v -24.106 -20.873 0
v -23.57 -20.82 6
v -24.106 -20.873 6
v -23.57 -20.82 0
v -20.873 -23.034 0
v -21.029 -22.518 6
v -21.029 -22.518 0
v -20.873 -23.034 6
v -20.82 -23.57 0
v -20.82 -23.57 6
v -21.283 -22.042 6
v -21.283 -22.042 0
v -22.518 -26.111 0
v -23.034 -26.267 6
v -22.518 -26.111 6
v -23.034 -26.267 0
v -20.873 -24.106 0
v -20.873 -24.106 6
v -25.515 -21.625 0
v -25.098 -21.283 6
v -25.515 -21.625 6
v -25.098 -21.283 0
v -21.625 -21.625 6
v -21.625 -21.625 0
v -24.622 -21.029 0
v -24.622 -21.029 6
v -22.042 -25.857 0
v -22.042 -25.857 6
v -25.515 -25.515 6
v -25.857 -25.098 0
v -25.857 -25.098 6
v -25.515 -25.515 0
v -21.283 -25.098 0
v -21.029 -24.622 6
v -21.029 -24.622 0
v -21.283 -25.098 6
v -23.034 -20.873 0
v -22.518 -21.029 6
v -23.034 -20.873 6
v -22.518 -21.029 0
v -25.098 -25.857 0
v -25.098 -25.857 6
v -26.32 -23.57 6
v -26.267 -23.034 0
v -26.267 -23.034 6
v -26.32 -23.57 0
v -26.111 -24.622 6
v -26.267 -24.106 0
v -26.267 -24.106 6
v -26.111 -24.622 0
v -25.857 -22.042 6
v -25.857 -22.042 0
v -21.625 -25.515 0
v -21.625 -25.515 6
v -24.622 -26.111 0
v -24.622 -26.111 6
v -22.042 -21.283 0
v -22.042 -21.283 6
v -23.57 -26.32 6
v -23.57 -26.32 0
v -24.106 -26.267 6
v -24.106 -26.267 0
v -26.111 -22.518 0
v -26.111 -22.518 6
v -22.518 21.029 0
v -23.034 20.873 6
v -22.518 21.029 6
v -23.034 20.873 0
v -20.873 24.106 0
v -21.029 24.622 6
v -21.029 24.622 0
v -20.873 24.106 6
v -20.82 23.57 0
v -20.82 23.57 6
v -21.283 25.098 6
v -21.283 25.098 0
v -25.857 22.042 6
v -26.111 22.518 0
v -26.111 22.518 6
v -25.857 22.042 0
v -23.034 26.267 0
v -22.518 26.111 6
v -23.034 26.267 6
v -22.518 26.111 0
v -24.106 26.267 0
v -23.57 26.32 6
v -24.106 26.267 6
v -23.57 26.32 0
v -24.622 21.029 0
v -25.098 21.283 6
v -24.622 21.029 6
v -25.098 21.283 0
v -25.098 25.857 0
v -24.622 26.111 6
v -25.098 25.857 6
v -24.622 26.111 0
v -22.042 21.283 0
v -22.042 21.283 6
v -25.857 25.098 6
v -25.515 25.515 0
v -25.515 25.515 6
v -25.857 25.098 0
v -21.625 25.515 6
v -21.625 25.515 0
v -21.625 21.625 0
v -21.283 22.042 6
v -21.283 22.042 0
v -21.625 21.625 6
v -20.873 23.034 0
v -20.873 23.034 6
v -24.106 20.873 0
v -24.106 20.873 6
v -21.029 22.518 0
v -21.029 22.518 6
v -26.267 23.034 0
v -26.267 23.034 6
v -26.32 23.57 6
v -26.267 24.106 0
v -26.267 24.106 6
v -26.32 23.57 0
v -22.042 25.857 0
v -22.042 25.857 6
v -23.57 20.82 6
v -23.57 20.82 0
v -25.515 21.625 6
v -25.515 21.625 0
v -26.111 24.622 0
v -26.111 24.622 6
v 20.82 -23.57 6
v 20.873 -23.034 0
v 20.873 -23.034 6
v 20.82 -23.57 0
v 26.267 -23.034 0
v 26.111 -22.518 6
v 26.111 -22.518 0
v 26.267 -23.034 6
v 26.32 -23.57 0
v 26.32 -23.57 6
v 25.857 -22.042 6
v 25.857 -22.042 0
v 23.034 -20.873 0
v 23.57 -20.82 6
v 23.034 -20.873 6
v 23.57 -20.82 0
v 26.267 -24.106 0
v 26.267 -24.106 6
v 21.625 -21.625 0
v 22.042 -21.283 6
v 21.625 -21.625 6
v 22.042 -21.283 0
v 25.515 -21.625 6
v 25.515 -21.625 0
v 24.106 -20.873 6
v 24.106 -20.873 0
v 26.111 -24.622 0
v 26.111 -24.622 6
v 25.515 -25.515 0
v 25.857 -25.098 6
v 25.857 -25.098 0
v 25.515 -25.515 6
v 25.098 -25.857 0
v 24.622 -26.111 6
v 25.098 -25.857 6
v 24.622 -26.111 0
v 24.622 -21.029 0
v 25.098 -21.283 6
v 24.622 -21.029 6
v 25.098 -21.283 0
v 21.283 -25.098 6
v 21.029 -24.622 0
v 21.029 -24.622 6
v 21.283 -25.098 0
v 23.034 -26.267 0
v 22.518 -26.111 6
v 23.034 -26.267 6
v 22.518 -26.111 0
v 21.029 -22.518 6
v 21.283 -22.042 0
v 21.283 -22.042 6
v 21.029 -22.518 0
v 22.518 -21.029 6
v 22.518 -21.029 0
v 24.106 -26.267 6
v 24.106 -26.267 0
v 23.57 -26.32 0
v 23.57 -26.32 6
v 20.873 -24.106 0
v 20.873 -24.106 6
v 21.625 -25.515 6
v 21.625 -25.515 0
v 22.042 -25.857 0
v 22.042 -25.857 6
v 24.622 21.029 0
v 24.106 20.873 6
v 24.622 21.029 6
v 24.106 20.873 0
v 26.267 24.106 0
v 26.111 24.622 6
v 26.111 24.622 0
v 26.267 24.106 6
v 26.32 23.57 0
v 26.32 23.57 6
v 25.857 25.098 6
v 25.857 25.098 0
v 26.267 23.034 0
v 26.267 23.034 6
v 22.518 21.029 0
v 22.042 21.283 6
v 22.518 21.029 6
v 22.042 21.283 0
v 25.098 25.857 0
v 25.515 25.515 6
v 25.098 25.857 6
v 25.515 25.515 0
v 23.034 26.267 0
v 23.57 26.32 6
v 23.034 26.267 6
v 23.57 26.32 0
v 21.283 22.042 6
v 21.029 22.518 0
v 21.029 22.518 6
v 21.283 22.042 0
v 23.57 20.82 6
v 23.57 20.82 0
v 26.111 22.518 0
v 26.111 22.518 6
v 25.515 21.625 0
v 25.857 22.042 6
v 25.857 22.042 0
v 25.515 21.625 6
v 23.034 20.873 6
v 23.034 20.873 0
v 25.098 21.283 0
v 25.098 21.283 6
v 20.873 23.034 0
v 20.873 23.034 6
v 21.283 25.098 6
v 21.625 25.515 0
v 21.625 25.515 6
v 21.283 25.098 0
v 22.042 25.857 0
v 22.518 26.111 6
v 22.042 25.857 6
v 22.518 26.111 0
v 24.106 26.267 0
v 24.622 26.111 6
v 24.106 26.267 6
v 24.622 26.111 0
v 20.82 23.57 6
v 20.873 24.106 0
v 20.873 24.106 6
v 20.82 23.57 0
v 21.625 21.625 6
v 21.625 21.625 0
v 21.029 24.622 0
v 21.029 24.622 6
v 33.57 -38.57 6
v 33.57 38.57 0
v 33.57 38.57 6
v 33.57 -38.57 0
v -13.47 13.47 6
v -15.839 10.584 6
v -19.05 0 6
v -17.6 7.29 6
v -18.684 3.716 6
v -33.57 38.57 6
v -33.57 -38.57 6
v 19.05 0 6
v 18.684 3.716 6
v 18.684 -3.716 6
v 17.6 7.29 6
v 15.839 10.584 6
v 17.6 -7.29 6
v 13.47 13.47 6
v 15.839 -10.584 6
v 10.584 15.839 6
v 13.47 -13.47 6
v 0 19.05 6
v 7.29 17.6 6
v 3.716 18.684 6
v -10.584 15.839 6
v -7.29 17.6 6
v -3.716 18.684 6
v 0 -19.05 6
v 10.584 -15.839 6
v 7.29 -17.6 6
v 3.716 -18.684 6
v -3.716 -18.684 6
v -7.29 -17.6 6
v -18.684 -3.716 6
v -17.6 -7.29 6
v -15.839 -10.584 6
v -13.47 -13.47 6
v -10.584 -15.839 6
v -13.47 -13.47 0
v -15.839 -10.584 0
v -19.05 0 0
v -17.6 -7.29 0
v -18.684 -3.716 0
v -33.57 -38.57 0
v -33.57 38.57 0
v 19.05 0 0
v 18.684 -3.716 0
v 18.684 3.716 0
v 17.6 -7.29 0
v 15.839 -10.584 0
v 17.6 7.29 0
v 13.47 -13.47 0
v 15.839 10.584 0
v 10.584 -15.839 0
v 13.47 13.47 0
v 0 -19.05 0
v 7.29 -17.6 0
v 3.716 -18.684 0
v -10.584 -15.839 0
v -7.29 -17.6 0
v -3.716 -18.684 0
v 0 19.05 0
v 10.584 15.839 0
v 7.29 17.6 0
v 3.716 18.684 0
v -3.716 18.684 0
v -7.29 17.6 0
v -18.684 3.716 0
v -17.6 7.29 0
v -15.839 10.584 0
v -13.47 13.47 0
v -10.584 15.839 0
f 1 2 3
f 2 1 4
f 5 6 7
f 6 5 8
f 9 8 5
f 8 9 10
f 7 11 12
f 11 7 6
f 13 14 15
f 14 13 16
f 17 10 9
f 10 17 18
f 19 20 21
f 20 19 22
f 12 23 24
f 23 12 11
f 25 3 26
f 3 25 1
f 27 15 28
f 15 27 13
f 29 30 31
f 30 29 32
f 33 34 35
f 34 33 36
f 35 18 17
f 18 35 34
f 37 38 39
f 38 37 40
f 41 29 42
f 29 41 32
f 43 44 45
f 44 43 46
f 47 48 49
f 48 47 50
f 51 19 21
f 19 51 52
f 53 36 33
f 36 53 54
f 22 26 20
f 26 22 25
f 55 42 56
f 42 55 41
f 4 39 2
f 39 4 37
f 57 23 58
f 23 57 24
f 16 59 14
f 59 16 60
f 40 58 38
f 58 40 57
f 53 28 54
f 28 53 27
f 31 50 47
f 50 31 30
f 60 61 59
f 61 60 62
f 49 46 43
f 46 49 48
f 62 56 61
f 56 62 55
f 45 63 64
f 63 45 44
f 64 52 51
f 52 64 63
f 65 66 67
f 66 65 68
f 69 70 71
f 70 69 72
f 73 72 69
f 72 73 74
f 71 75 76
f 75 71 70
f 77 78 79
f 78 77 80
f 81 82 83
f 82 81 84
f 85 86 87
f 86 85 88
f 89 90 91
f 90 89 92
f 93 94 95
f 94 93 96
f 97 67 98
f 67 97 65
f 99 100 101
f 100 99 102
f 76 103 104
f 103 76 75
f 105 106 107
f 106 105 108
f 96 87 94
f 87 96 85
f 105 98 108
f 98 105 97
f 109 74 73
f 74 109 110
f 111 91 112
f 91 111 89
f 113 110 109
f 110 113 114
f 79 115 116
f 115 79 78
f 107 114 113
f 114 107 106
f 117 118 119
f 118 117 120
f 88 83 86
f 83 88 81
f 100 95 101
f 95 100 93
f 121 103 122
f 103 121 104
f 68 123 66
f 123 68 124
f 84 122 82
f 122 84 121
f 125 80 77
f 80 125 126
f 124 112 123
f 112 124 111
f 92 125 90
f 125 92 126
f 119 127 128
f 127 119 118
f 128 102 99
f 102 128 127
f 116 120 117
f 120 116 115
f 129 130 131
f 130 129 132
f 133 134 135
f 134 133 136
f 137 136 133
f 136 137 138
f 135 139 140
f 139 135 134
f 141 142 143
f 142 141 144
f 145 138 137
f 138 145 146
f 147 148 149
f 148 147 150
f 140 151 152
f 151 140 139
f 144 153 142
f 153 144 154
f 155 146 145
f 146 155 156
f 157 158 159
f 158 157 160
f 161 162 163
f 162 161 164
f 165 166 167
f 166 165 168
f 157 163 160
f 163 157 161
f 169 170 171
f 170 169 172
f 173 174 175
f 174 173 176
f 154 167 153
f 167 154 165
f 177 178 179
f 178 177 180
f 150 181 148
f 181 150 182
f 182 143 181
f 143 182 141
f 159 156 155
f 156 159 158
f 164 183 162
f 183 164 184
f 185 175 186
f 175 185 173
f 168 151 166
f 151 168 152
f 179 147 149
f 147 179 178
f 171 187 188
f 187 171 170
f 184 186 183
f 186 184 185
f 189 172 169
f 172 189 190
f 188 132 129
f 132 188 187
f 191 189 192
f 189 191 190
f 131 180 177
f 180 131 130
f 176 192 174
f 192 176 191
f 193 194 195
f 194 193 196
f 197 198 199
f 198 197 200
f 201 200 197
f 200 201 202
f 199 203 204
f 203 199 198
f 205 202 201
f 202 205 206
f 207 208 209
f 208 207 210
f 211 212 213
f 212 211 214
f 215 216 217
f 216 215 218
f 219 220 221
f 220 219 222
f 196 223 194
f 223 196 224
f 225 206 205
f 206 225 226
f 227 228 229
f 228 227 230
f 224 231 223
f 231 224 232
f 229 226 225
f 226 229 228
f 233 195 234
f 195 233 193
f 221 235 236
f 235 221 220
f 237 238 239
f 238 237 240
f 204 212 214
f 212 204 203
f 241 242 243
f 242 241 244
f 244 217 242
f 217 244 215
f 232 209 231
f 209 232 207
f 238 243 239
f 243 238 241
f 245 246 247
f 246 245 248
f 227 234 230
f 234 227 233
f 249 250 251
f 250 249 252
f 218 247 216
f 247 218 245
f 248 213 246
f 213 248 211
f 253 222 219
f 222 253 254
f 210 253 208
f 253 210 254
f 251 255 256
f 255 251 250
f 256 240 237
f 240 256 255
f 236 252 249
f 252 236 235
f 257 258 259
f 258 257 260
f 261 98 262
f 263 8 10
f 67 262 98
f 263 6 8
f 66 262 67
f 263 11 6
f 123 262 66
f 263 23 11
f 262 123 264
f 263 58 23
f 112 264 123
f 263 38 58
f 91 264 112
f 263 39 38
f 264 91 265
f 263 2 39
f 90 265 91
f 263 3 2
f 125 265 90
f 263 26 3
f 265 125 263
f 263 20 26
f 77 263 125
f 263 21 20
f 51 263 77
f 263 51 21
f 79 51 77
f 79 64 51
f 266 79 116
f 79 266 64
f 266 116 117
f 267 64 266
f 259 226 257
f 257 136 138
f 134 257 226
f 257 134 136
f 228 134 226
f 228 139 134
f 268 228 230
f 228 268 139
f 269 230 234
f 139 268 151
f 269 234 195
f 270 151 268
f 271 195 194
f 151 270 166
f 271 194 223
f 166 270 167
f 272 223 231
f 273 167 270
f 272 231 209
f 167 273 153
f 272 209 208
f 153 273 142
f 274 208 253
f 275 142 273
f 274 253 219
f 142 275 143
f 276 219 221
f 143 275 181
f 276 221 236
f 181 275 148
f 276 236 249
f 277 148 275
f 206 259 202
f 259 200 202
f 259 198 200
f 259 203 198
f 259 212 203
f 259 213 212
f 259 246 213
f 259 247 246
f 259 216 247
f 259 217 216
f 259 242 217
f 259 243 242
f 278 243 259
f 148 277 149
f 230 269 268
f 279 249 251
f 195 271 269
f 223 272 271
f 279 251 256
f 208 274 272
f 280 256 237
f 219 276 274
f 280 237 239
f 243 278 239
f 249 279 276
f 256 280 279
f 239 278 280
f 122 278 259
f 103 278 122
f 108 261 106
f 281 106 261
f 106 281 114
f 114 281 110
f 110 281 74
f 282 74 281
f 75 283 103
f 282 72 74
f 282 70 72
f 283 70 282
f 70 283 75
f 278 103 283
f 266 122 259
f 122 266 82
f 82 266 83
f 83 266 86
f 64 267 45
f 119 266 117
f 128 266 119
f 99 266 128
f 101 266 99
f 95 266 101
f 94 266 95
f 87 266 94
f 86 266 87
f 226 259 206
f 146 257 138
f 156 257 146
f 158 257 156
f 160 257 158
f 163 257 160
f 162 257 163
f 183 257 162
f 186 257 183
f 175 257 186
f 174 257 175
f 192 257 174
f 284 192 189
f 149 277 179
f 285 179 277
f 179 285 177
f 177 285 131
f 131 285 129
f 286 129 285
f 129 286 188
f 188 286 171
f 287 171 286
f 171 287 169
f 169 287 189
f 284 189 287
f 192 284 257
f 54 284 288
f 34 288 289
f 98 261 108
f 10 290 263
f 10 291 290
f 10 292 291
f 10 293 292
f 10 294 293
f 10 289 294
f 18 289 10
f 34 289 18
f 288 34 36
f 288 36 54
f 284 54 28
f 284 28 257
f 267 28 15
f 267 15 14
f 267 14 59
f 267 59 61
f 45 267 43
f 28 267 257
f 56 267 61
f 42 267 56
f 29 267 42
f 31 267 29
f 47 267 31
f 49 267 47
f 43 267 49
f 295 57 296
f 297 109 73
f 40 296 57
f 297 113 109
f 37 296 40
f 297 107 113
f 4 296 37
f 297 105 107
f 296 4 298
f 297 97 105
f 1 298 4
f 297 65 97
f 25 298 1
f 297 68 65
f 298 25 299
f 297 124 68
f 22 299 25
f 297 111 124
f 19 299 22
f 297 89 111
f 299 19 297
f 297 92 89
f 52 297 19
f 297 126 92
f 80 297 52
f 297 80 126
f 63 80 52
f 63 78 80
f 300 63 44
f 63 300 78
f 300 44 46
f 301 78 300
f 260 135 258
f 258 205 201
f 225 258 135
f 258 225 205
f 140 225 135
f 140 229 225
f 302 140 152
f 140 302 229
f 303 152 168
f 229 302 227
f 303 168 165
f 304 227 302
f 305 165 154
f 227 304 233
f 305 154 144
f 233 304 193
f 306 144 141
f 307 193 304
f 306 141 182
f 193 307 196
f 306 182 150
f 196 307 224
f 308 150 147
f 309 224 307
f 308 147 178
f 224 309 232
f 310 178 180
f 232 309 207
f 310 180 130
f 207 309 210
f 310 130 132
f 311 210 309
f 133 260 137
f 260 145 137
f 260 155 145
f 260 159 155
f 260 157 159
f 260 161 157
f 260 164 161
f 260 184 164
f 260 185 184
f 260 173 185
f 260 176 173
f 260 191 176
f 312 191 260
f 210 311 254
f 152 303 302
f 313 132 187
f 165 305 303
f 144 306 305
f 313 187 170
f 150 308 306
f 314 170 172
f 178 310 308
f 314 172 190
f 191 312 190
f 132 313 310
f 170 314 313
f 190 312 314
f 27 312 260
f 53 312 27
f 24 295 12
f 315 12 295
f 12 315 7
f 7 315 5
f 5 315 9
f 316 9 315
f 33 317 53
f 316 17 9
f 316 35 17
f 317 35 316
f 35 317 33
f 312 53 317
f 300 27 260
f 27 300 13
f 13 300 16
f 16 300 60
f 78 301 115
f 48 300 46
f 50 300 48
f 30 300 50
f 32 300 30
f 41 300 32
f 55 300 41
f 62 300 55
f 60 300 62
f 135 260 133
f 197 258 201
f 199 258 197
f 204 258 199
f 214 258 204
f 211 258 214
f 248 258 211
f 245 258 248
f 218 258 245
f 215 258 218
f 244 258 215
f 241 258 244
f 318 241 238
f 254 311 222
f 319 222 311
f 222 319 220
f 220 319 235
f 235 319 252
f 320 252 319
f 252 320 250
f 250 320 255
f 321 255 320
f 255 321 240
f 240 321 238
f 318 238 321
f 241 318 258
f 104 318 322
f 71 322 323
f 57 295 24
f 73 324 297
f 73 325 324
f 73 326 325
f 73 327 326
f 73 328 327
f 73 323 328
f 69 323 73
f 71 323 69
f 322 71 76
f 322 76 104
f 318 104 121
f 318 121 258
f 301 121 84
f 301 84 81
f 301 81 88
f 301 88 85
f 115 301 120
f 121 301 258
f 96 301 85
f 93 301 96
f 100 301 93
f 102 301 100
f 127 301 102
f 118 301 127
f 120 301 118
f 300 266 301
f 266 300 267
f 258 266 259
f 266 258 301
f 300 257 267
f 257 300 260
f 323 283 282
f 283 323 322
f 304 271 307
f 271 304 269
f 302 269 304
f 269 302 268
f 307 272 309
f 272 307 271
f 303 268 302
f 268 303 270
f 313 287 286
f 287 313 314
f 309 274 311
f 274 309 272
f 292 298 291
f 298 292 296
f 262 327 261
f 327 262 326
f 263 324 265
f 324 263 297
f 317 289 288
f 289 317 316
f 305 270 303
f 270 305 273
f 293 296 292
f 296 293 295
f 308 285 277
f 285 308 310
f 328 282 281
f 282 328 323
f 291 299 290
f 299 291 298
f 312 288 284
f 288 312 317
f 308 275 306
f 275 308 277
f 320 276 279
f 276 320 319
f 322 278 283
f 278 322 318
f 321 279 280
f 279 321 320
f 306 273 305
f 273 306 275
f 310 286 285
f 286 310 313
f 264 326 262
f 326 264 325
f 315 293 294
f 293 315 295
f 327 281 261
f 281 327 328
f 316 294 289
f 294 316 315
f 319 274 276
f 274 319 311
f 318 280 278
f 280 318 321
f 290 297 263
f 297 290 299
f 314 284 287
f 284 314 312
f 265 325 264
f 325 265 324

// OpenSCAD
$fn = 32;

// ----------------------------------------------------------------------
// Motor mount plate: NEMA23, 67.14 x 77.14 x 6 mm
// ----------------------------------------------------------------------

// --- parameters (mm) ---
plate_w = 67.14;          // plate length, X
plate_d = 77.14;          // plate width, Y
plate_t = 6;              // plate thickness
pattern = 47.14;          // NEMA23 bolt spacing
motor_d = 5.5;            // NEMA23 screw clearance
pilot_d = 38.1;           // pilot boss bore

module plate() {
  translate([-plate_w / 2, -plate_d / 2, 0]) cube([plate_w, plate_d, plate_t]);
}

module motor_holes() {
  for (sx = [-1, 1]) for (sy = [-1, 1])
    translate([sx * pattern / 2, sy * pattern / 2, -1])
      cylinder(h = plate_t + 2, d = motor_d);
}

difference() {
  union() {
    plate();
  }
  motor_holes();
  translate([0, 0, -1]) cylinder(h = plate_t + 2, d = pilot_d);
}
